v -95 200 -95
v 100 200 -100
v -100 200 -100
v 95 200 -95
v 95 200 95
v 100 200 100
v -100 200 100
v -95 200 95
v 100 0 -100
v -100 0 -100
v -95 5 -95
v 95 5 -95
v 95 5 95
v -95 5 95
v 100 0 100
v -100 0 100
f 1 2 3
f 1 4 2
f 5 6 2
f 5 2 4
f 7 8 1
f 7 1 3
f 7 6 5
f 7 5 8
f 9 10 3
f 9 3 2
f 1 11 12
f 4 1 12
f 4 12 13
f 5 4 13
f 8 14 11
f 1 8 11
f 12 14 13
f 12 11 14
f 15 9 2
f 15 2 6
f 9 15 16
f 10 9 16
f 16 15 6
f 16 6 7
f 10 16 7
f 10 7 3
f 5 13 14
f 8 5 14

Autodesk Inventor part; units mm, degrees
ref_plane "YZ Plane" through (0, 0, 0) normal (1, 0, 0) x (0, 1, 0)
ref_plane "XZ Plane" through (0, 0, 0) normal (0, 1, 0) x (-1, 0, 0)
ref_plane "XY Plane" through (0, 0, 0) normal (0, 0, 1) x (1, 0, 0)
sketch "스케치1" plane through (0, 0, 0) normal (0, 1, 0) x (-1, 0, 0)
  line L0 (100, -100) -> (-100, -100)
  line L1 (-100, -100) -> (-100, 100)
  line L2 (-100, 100) -> (100, 100)
  line L3 (100, 100) -> (100, -100)
  line L4 (100, -100) -> (-100, 100) construction
  line L5 (-100, -100) -> (100, 100) construction
  point P0 (0, 0)
  dimension "d0" = 200
  dimension "d1" = 200
extrude "돌출1" add sketch "스케치1" along normal blind 200
sketch "스케치2" plane through (0, 200, 0) normal (0, 1, 0) x (1, 0, 0)
  line L0 (-95, 95) -> (95, 95)
  line L1 (95, 95) -> (95, -95)
  line L2 (95, -95) -> (-95, -95)
  line L3 (-95, -95) -> (-95, 95)
  line L4 (-95, 95) -> (95, -95) construction
  line L5 (95, 95) -> (-95, -95) construction
  point P0 (0, 0)
  dimension "d4" = 190
  dimension "d5" = 190
extrude "돌출2" cut sketch "스케치2" against normal blind 195
properties part number "safe"
